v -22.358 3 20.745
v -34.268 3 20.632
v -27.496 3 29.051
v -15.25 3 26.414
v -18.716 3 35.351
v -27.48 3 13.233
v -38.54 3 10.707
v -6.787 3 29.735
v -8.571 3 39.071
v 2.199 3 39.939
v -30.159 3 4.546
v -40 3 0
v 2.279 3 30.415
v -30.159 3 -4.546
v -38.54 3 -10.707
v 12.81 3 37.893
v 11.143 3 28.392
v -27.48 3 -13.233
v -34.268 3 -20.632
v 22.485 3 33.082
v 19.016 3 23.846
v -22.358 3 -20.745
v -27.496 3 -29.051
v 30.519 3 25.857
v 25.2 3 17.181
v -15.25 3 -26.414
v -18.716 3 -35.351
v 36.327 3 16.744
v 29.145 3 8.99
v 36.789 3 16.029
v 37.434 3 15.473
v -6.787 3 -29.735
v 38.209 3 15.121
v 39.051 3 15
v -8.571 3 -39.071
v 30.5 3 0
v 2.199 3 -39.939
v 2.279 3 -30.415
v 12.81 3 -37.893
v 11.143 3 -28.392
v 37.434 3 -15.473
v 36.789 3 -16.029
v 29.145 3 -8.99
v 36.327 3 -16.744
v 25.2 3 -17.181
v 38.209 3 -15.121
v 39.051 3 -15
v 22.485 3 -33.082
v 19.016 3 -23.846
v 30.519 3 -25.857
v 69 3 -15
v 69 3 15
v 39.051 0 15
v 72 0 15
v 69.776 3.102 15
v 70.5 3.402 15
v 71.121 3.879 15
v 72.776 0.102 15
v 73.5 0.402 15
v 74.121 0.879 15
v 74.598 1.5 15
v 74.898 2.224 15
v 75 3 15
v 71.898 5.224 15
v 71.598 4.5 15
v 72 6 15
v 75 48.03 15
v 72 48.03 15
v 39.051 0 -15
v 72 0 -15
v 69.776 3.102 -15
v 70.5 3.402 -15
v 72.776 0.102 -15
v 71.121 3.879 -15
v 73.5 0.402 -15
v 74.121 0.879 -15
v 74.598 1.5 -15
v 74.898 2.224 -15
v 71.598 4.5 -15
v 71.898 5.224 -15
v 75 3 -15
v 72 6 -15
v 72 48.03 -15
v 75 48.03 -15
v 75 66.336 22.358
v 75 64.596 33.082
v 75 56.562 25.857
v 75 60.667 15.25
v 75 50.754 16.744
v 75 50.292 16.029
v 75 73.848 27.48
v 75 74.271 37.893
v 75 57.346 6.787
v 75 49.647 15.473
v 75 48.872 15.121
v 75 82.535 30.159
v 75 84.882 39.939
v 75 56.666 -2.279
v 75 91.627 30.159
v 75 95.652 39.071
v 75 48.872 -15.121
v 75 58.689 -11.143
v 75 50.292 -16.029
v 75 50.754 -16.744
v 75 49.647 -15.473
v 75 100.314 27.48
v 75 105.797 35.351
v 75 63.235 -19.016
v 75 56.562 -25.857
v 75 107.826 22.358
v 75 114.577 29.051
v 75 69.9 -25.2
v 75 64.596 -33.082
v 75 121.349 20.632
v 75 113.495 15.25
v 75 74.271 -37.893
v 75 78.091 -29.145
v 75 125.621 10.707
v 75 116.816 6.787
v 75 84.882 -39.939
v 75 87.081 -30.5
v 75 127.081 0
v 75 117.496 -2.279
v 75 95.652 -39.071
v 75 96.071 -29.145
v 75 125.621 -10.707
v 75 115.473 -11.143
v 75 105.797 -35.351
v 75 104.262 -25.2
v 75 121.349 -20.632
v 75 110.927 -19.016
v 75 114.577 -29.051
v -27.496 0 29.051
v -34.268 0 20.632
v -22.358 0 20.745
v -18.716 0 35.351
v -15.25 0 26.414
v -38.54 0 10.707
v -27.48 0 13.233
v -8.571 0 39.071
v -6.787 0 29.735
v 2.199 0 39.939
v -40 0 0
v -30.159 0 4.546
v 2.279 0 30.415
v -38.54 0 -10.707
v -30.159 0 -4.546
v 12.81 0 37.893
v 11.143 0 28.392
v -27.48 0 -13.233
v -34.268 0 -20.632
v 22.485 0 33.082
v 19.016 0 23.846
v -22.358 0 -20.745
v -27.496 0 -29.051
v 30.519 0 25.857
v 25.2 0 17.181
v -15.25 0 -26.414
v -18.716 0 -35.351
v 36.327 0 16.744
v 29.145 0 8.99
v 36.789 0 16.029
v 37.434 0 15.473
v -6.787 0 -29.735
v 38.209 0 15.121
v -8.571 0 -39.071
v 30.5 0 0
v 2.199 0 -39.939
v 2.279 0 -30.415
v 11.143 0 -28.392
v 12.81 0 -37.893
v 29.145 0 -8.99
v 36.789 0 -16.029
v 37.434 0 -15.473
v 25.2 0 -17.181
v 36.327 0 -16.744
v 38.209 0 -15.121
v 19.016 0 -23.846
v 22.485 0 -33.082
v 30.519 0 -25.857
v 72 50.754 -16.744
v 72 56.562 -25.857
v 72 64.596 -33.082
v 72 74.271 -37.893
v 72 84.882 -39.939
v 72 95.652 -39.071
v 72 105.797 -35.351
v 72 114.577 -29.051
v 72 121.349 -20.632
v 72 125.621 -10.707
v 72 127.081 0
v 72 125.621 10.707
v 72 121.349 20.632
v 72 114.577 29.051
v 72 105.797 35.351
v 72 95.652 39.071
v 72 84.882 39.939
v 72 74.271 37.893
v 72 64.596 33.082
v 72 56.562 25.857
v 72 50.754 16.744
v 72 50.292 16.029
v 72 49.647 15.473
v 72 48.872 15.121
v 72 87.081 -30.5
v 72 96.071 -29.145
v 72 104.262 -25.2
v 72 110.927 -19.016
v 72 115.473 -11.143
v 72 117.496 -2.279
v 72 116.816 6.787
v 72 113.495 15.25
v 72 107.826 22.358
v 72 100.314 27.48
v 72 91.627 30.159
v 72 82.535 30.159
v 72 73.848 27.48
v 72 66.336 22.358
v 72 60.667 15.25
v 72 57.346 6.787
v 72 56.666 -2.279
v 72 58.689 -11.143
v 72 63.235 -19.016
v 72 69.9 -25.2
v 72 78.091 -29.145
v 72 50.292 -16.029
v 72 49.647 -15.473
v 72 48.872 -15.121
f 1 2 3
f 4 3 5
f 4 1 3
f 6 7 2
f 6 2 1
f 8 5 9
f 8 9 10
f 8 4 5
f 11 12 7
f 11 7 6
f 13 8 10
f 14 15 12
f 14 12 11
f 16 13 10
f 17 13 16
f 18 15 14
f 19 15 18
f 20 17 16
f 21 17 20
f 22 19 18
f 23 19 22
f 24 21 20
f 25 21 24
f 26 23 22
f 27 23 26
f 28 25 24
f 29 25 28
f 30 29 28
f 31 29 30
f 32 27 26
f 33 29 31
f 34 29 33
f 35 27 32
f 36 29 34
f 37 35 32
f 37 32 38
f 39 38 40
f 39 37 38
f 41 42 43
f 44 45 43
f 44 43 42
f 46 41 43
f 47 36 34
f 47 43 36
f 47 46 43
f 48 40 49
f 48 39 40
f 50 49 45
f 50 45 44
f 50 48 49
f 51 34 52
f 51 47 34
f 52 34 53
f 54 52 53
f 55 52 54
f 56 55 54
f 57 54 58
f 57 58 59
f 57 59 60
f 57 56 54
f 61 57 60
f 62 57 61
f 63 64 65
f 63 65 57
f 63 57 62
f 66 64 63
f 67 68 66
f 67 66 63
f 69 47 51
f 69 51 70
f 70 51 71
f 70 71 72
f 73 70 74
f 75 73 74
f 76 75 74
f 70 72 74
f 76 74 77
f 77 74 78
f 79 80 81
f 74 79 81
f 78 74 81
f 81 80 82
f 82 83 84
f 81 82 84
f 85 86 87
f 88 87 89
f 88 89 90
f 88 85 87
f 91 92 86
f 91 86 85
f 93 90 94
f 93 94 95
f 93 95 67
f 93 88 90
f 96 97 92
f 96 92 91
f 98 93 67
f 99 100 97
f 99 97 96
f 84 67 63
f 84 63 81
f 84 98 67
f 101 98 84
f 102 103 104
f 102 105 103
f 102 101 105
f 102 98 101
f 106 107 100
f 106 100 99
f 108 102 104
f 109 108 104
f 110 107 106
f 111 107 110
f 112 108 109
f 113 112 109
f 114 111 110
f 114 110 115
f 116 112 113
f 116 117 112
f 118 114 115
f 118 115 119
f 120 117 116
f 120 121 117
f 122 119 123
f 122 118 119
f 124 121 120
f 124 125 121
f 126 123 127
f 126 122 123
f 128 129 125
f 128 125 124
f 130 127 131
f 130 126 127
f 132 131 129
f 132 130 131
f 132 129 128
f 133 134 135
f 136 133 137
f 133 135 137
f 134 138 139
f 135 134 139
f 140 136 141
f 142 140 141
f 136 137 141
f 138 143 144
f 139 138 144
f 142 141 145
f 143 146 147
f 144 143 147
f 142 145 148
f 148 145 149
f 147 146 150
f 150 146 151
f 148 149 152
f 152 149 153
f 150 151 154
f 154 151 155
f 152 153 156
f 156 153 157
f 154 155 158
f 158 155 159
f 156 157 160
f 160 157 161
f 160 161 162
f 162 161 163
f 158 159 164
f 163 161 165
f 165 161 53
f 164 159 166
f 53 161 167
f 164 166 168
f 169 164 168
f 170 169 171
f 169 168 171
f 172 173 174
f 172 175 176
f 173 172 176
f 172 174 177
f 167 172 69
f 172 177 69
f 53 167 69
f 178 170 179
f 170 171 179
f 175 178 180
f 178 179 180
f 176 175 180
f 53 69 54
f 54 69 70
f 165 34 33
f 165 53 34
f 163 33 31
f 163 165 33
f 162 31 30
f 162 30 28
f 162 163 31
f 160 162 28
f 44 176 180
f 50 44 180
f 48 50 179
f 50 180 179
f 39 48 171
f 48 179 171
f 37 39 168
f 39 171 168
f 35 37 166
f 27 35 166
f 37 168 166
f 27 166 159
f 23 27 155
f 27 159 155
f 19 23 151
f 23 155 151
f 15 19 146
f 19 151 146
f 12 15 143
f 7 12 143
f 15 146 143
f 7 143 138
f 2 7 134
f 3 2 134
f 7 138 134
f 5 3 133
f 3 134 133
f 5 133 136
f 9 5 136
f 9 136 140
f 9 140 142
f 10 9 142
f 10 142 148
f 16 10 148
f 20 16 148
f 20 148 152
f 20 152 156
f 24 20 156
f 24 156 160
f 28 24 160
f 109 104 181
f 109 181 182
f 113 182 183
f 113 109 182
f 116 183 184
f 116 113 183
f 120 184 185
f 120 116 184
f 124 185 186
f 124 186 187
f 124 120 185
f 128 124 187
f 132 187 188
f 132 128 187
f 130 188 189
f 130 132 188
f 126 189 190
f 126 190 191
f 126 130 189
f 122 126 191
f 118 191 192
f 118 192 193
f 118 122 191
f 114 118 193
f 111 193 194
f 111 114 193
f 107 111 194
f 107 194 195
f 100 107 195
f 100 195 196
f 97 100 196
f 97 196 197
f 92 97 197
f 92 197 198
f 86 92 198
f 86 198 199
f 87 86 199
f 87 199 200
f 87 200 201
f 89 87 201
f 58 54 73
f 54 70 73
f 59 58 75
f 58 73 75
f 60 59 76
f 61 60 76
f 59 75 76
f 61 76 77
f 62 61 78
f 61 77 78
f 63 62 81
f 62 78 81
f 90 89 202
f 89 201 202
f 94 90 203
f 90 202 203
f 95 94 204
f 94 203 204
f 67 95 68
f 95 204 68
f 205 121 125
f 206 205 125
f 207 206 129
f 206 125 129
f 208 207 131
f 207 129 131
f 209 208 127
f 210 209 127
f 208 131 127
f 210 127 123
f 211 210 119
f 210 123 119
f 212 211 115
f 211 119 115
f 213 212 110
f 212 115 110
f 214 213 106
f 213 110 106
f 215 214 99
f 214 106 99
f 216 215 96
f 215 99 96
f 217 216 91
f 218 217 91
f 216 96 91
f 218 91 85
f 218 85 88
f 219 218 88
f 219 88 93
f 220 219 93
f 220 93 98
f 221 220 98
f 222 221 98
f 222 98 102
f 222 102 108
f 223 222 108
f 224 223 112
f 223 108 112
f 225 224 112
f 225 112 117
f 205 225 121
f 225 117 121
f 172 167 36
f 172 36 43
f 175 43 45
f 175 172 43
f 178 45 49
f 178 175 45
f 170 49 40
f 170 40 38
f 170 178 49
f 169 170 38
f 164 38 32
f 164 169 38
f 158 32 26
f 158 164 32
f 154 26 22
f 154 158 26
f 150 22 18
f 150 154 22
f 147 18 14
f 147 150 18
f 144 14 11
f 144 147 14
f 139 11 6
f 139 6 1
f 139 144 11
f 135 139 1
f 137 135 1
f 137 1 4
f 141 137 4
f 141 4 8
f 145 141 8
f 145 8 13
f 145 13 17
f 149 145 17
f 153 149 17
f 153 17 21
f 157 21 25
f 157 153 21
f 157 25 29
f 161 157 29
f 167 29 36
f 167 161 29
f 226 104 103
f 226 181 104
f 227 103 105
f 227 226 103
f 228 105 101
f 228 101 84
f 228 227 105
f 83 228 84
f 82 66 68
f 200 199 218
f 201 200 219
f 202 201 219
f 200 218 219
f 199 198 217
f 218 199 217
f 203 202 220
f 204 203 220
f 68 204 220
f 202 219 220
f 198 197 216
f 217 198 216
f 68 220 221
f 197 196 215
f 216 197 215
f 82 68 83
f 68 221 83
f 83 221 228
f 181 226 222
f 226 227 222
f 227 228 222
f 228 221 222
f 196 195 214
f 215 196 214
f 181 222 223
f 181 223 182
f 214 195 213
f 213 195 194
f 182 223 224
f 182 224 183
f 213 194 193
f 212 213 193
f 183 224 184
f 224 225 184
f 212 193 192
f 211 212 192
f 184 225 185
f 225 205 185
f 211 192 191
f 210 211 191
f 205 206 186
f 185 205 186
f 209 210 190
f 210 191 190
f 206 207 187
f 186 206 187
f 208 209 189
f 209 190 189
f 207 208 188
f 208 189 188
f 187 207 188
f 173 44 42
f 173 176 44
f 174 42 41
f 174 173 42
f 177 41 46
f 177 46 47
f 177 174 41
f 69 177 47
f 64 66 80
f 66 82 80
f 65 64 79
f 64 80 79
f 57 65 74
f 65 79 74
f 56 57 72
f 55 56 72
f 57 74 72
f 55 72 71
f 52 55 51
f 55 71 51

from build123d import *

# Parameters (mm, degrees)
SKETCH1_R           = 40
SKETCH1_R_2         = 30.5
BOSS_EXTRUDE1_DEPTH = 3
SKETCH2_W           = 40
SKETCH2_H           = 30
BOSS_EXTRUDE2_DEPTH = 3
SKETCH3_R           = 30.5
BOSS_EXTRUDE3_DEPTH = 3
FILLET1_R           = 3
FILLET2_R           = 3


with BuildPart() as part:
    # Sketch1 → Boss-Extrude1 (new body)
    with BuildSketch(Plane(origin=(0, 0, 0), x_dir=(1, 0, 0), z_dir=(0, 1, 0))):
        Circle(SKETCH1_R)
        Circle(SKETCH1_R_2, mode=Mode.SUBTRACT)
    extrude(amount=BOSS_EXTRUDE1_DEPTH)

    # Sketch2 → Boss-Extrude2 (add)
    with BuildSketch(Plane(origin=(0, 3, 0), x_dir=(1, 0, 0), z_dir=(0, 1, 0))):
        with Locations((55, 0)):
            Rectangle(SKETCH2_W, SKETCH2_H)
    extrude(amount=-BOSS_EXTRUDE2_DEPTH)

    # Sketch3 → Boss-Extrude3 (add)
    with BuildSketch(Plane(origin=(75, 0, 0), x_dir=(0, 0, -1), z_dir=(1, 0, 0))):
        with BuildLine():
            Line((-15, 0), (15, 0))
            Line((15, 0), (15, 50))
            ThreePointArc((15, 50), (0, 127.080992435), (-15, 50))
            Line((-15, 50), (-15, 0))
        make_face()
        with Locations((0, 87.080992435)):
            Circle(SKETCH3_R, mode=Mode.SUBTRACT)
    extrude(amount=-BOSS_EXTRUDE3_DEPTH)

    # Fillet1
    fillet1_edges = [part.edges().sort_by_distance(p)[0] for p in [
        (37.080992435, 1.5, 15),
        (37.080992435, 1.5, -15),
        (73.5, 50, 15),
        (73.5, 50, -15),
    ]]
    fillet(fillet1_edges, radius=FILLET1_R)

    # Fillet2
    fillet2_edges = [part.edges().sort_by_distance(p)[0] for p in [
        (75, 0, 0),
        (72, 3, 0),
    ]]
    fillet(fillet2_edges, radius=FILLET2_R)


solid = part.part
